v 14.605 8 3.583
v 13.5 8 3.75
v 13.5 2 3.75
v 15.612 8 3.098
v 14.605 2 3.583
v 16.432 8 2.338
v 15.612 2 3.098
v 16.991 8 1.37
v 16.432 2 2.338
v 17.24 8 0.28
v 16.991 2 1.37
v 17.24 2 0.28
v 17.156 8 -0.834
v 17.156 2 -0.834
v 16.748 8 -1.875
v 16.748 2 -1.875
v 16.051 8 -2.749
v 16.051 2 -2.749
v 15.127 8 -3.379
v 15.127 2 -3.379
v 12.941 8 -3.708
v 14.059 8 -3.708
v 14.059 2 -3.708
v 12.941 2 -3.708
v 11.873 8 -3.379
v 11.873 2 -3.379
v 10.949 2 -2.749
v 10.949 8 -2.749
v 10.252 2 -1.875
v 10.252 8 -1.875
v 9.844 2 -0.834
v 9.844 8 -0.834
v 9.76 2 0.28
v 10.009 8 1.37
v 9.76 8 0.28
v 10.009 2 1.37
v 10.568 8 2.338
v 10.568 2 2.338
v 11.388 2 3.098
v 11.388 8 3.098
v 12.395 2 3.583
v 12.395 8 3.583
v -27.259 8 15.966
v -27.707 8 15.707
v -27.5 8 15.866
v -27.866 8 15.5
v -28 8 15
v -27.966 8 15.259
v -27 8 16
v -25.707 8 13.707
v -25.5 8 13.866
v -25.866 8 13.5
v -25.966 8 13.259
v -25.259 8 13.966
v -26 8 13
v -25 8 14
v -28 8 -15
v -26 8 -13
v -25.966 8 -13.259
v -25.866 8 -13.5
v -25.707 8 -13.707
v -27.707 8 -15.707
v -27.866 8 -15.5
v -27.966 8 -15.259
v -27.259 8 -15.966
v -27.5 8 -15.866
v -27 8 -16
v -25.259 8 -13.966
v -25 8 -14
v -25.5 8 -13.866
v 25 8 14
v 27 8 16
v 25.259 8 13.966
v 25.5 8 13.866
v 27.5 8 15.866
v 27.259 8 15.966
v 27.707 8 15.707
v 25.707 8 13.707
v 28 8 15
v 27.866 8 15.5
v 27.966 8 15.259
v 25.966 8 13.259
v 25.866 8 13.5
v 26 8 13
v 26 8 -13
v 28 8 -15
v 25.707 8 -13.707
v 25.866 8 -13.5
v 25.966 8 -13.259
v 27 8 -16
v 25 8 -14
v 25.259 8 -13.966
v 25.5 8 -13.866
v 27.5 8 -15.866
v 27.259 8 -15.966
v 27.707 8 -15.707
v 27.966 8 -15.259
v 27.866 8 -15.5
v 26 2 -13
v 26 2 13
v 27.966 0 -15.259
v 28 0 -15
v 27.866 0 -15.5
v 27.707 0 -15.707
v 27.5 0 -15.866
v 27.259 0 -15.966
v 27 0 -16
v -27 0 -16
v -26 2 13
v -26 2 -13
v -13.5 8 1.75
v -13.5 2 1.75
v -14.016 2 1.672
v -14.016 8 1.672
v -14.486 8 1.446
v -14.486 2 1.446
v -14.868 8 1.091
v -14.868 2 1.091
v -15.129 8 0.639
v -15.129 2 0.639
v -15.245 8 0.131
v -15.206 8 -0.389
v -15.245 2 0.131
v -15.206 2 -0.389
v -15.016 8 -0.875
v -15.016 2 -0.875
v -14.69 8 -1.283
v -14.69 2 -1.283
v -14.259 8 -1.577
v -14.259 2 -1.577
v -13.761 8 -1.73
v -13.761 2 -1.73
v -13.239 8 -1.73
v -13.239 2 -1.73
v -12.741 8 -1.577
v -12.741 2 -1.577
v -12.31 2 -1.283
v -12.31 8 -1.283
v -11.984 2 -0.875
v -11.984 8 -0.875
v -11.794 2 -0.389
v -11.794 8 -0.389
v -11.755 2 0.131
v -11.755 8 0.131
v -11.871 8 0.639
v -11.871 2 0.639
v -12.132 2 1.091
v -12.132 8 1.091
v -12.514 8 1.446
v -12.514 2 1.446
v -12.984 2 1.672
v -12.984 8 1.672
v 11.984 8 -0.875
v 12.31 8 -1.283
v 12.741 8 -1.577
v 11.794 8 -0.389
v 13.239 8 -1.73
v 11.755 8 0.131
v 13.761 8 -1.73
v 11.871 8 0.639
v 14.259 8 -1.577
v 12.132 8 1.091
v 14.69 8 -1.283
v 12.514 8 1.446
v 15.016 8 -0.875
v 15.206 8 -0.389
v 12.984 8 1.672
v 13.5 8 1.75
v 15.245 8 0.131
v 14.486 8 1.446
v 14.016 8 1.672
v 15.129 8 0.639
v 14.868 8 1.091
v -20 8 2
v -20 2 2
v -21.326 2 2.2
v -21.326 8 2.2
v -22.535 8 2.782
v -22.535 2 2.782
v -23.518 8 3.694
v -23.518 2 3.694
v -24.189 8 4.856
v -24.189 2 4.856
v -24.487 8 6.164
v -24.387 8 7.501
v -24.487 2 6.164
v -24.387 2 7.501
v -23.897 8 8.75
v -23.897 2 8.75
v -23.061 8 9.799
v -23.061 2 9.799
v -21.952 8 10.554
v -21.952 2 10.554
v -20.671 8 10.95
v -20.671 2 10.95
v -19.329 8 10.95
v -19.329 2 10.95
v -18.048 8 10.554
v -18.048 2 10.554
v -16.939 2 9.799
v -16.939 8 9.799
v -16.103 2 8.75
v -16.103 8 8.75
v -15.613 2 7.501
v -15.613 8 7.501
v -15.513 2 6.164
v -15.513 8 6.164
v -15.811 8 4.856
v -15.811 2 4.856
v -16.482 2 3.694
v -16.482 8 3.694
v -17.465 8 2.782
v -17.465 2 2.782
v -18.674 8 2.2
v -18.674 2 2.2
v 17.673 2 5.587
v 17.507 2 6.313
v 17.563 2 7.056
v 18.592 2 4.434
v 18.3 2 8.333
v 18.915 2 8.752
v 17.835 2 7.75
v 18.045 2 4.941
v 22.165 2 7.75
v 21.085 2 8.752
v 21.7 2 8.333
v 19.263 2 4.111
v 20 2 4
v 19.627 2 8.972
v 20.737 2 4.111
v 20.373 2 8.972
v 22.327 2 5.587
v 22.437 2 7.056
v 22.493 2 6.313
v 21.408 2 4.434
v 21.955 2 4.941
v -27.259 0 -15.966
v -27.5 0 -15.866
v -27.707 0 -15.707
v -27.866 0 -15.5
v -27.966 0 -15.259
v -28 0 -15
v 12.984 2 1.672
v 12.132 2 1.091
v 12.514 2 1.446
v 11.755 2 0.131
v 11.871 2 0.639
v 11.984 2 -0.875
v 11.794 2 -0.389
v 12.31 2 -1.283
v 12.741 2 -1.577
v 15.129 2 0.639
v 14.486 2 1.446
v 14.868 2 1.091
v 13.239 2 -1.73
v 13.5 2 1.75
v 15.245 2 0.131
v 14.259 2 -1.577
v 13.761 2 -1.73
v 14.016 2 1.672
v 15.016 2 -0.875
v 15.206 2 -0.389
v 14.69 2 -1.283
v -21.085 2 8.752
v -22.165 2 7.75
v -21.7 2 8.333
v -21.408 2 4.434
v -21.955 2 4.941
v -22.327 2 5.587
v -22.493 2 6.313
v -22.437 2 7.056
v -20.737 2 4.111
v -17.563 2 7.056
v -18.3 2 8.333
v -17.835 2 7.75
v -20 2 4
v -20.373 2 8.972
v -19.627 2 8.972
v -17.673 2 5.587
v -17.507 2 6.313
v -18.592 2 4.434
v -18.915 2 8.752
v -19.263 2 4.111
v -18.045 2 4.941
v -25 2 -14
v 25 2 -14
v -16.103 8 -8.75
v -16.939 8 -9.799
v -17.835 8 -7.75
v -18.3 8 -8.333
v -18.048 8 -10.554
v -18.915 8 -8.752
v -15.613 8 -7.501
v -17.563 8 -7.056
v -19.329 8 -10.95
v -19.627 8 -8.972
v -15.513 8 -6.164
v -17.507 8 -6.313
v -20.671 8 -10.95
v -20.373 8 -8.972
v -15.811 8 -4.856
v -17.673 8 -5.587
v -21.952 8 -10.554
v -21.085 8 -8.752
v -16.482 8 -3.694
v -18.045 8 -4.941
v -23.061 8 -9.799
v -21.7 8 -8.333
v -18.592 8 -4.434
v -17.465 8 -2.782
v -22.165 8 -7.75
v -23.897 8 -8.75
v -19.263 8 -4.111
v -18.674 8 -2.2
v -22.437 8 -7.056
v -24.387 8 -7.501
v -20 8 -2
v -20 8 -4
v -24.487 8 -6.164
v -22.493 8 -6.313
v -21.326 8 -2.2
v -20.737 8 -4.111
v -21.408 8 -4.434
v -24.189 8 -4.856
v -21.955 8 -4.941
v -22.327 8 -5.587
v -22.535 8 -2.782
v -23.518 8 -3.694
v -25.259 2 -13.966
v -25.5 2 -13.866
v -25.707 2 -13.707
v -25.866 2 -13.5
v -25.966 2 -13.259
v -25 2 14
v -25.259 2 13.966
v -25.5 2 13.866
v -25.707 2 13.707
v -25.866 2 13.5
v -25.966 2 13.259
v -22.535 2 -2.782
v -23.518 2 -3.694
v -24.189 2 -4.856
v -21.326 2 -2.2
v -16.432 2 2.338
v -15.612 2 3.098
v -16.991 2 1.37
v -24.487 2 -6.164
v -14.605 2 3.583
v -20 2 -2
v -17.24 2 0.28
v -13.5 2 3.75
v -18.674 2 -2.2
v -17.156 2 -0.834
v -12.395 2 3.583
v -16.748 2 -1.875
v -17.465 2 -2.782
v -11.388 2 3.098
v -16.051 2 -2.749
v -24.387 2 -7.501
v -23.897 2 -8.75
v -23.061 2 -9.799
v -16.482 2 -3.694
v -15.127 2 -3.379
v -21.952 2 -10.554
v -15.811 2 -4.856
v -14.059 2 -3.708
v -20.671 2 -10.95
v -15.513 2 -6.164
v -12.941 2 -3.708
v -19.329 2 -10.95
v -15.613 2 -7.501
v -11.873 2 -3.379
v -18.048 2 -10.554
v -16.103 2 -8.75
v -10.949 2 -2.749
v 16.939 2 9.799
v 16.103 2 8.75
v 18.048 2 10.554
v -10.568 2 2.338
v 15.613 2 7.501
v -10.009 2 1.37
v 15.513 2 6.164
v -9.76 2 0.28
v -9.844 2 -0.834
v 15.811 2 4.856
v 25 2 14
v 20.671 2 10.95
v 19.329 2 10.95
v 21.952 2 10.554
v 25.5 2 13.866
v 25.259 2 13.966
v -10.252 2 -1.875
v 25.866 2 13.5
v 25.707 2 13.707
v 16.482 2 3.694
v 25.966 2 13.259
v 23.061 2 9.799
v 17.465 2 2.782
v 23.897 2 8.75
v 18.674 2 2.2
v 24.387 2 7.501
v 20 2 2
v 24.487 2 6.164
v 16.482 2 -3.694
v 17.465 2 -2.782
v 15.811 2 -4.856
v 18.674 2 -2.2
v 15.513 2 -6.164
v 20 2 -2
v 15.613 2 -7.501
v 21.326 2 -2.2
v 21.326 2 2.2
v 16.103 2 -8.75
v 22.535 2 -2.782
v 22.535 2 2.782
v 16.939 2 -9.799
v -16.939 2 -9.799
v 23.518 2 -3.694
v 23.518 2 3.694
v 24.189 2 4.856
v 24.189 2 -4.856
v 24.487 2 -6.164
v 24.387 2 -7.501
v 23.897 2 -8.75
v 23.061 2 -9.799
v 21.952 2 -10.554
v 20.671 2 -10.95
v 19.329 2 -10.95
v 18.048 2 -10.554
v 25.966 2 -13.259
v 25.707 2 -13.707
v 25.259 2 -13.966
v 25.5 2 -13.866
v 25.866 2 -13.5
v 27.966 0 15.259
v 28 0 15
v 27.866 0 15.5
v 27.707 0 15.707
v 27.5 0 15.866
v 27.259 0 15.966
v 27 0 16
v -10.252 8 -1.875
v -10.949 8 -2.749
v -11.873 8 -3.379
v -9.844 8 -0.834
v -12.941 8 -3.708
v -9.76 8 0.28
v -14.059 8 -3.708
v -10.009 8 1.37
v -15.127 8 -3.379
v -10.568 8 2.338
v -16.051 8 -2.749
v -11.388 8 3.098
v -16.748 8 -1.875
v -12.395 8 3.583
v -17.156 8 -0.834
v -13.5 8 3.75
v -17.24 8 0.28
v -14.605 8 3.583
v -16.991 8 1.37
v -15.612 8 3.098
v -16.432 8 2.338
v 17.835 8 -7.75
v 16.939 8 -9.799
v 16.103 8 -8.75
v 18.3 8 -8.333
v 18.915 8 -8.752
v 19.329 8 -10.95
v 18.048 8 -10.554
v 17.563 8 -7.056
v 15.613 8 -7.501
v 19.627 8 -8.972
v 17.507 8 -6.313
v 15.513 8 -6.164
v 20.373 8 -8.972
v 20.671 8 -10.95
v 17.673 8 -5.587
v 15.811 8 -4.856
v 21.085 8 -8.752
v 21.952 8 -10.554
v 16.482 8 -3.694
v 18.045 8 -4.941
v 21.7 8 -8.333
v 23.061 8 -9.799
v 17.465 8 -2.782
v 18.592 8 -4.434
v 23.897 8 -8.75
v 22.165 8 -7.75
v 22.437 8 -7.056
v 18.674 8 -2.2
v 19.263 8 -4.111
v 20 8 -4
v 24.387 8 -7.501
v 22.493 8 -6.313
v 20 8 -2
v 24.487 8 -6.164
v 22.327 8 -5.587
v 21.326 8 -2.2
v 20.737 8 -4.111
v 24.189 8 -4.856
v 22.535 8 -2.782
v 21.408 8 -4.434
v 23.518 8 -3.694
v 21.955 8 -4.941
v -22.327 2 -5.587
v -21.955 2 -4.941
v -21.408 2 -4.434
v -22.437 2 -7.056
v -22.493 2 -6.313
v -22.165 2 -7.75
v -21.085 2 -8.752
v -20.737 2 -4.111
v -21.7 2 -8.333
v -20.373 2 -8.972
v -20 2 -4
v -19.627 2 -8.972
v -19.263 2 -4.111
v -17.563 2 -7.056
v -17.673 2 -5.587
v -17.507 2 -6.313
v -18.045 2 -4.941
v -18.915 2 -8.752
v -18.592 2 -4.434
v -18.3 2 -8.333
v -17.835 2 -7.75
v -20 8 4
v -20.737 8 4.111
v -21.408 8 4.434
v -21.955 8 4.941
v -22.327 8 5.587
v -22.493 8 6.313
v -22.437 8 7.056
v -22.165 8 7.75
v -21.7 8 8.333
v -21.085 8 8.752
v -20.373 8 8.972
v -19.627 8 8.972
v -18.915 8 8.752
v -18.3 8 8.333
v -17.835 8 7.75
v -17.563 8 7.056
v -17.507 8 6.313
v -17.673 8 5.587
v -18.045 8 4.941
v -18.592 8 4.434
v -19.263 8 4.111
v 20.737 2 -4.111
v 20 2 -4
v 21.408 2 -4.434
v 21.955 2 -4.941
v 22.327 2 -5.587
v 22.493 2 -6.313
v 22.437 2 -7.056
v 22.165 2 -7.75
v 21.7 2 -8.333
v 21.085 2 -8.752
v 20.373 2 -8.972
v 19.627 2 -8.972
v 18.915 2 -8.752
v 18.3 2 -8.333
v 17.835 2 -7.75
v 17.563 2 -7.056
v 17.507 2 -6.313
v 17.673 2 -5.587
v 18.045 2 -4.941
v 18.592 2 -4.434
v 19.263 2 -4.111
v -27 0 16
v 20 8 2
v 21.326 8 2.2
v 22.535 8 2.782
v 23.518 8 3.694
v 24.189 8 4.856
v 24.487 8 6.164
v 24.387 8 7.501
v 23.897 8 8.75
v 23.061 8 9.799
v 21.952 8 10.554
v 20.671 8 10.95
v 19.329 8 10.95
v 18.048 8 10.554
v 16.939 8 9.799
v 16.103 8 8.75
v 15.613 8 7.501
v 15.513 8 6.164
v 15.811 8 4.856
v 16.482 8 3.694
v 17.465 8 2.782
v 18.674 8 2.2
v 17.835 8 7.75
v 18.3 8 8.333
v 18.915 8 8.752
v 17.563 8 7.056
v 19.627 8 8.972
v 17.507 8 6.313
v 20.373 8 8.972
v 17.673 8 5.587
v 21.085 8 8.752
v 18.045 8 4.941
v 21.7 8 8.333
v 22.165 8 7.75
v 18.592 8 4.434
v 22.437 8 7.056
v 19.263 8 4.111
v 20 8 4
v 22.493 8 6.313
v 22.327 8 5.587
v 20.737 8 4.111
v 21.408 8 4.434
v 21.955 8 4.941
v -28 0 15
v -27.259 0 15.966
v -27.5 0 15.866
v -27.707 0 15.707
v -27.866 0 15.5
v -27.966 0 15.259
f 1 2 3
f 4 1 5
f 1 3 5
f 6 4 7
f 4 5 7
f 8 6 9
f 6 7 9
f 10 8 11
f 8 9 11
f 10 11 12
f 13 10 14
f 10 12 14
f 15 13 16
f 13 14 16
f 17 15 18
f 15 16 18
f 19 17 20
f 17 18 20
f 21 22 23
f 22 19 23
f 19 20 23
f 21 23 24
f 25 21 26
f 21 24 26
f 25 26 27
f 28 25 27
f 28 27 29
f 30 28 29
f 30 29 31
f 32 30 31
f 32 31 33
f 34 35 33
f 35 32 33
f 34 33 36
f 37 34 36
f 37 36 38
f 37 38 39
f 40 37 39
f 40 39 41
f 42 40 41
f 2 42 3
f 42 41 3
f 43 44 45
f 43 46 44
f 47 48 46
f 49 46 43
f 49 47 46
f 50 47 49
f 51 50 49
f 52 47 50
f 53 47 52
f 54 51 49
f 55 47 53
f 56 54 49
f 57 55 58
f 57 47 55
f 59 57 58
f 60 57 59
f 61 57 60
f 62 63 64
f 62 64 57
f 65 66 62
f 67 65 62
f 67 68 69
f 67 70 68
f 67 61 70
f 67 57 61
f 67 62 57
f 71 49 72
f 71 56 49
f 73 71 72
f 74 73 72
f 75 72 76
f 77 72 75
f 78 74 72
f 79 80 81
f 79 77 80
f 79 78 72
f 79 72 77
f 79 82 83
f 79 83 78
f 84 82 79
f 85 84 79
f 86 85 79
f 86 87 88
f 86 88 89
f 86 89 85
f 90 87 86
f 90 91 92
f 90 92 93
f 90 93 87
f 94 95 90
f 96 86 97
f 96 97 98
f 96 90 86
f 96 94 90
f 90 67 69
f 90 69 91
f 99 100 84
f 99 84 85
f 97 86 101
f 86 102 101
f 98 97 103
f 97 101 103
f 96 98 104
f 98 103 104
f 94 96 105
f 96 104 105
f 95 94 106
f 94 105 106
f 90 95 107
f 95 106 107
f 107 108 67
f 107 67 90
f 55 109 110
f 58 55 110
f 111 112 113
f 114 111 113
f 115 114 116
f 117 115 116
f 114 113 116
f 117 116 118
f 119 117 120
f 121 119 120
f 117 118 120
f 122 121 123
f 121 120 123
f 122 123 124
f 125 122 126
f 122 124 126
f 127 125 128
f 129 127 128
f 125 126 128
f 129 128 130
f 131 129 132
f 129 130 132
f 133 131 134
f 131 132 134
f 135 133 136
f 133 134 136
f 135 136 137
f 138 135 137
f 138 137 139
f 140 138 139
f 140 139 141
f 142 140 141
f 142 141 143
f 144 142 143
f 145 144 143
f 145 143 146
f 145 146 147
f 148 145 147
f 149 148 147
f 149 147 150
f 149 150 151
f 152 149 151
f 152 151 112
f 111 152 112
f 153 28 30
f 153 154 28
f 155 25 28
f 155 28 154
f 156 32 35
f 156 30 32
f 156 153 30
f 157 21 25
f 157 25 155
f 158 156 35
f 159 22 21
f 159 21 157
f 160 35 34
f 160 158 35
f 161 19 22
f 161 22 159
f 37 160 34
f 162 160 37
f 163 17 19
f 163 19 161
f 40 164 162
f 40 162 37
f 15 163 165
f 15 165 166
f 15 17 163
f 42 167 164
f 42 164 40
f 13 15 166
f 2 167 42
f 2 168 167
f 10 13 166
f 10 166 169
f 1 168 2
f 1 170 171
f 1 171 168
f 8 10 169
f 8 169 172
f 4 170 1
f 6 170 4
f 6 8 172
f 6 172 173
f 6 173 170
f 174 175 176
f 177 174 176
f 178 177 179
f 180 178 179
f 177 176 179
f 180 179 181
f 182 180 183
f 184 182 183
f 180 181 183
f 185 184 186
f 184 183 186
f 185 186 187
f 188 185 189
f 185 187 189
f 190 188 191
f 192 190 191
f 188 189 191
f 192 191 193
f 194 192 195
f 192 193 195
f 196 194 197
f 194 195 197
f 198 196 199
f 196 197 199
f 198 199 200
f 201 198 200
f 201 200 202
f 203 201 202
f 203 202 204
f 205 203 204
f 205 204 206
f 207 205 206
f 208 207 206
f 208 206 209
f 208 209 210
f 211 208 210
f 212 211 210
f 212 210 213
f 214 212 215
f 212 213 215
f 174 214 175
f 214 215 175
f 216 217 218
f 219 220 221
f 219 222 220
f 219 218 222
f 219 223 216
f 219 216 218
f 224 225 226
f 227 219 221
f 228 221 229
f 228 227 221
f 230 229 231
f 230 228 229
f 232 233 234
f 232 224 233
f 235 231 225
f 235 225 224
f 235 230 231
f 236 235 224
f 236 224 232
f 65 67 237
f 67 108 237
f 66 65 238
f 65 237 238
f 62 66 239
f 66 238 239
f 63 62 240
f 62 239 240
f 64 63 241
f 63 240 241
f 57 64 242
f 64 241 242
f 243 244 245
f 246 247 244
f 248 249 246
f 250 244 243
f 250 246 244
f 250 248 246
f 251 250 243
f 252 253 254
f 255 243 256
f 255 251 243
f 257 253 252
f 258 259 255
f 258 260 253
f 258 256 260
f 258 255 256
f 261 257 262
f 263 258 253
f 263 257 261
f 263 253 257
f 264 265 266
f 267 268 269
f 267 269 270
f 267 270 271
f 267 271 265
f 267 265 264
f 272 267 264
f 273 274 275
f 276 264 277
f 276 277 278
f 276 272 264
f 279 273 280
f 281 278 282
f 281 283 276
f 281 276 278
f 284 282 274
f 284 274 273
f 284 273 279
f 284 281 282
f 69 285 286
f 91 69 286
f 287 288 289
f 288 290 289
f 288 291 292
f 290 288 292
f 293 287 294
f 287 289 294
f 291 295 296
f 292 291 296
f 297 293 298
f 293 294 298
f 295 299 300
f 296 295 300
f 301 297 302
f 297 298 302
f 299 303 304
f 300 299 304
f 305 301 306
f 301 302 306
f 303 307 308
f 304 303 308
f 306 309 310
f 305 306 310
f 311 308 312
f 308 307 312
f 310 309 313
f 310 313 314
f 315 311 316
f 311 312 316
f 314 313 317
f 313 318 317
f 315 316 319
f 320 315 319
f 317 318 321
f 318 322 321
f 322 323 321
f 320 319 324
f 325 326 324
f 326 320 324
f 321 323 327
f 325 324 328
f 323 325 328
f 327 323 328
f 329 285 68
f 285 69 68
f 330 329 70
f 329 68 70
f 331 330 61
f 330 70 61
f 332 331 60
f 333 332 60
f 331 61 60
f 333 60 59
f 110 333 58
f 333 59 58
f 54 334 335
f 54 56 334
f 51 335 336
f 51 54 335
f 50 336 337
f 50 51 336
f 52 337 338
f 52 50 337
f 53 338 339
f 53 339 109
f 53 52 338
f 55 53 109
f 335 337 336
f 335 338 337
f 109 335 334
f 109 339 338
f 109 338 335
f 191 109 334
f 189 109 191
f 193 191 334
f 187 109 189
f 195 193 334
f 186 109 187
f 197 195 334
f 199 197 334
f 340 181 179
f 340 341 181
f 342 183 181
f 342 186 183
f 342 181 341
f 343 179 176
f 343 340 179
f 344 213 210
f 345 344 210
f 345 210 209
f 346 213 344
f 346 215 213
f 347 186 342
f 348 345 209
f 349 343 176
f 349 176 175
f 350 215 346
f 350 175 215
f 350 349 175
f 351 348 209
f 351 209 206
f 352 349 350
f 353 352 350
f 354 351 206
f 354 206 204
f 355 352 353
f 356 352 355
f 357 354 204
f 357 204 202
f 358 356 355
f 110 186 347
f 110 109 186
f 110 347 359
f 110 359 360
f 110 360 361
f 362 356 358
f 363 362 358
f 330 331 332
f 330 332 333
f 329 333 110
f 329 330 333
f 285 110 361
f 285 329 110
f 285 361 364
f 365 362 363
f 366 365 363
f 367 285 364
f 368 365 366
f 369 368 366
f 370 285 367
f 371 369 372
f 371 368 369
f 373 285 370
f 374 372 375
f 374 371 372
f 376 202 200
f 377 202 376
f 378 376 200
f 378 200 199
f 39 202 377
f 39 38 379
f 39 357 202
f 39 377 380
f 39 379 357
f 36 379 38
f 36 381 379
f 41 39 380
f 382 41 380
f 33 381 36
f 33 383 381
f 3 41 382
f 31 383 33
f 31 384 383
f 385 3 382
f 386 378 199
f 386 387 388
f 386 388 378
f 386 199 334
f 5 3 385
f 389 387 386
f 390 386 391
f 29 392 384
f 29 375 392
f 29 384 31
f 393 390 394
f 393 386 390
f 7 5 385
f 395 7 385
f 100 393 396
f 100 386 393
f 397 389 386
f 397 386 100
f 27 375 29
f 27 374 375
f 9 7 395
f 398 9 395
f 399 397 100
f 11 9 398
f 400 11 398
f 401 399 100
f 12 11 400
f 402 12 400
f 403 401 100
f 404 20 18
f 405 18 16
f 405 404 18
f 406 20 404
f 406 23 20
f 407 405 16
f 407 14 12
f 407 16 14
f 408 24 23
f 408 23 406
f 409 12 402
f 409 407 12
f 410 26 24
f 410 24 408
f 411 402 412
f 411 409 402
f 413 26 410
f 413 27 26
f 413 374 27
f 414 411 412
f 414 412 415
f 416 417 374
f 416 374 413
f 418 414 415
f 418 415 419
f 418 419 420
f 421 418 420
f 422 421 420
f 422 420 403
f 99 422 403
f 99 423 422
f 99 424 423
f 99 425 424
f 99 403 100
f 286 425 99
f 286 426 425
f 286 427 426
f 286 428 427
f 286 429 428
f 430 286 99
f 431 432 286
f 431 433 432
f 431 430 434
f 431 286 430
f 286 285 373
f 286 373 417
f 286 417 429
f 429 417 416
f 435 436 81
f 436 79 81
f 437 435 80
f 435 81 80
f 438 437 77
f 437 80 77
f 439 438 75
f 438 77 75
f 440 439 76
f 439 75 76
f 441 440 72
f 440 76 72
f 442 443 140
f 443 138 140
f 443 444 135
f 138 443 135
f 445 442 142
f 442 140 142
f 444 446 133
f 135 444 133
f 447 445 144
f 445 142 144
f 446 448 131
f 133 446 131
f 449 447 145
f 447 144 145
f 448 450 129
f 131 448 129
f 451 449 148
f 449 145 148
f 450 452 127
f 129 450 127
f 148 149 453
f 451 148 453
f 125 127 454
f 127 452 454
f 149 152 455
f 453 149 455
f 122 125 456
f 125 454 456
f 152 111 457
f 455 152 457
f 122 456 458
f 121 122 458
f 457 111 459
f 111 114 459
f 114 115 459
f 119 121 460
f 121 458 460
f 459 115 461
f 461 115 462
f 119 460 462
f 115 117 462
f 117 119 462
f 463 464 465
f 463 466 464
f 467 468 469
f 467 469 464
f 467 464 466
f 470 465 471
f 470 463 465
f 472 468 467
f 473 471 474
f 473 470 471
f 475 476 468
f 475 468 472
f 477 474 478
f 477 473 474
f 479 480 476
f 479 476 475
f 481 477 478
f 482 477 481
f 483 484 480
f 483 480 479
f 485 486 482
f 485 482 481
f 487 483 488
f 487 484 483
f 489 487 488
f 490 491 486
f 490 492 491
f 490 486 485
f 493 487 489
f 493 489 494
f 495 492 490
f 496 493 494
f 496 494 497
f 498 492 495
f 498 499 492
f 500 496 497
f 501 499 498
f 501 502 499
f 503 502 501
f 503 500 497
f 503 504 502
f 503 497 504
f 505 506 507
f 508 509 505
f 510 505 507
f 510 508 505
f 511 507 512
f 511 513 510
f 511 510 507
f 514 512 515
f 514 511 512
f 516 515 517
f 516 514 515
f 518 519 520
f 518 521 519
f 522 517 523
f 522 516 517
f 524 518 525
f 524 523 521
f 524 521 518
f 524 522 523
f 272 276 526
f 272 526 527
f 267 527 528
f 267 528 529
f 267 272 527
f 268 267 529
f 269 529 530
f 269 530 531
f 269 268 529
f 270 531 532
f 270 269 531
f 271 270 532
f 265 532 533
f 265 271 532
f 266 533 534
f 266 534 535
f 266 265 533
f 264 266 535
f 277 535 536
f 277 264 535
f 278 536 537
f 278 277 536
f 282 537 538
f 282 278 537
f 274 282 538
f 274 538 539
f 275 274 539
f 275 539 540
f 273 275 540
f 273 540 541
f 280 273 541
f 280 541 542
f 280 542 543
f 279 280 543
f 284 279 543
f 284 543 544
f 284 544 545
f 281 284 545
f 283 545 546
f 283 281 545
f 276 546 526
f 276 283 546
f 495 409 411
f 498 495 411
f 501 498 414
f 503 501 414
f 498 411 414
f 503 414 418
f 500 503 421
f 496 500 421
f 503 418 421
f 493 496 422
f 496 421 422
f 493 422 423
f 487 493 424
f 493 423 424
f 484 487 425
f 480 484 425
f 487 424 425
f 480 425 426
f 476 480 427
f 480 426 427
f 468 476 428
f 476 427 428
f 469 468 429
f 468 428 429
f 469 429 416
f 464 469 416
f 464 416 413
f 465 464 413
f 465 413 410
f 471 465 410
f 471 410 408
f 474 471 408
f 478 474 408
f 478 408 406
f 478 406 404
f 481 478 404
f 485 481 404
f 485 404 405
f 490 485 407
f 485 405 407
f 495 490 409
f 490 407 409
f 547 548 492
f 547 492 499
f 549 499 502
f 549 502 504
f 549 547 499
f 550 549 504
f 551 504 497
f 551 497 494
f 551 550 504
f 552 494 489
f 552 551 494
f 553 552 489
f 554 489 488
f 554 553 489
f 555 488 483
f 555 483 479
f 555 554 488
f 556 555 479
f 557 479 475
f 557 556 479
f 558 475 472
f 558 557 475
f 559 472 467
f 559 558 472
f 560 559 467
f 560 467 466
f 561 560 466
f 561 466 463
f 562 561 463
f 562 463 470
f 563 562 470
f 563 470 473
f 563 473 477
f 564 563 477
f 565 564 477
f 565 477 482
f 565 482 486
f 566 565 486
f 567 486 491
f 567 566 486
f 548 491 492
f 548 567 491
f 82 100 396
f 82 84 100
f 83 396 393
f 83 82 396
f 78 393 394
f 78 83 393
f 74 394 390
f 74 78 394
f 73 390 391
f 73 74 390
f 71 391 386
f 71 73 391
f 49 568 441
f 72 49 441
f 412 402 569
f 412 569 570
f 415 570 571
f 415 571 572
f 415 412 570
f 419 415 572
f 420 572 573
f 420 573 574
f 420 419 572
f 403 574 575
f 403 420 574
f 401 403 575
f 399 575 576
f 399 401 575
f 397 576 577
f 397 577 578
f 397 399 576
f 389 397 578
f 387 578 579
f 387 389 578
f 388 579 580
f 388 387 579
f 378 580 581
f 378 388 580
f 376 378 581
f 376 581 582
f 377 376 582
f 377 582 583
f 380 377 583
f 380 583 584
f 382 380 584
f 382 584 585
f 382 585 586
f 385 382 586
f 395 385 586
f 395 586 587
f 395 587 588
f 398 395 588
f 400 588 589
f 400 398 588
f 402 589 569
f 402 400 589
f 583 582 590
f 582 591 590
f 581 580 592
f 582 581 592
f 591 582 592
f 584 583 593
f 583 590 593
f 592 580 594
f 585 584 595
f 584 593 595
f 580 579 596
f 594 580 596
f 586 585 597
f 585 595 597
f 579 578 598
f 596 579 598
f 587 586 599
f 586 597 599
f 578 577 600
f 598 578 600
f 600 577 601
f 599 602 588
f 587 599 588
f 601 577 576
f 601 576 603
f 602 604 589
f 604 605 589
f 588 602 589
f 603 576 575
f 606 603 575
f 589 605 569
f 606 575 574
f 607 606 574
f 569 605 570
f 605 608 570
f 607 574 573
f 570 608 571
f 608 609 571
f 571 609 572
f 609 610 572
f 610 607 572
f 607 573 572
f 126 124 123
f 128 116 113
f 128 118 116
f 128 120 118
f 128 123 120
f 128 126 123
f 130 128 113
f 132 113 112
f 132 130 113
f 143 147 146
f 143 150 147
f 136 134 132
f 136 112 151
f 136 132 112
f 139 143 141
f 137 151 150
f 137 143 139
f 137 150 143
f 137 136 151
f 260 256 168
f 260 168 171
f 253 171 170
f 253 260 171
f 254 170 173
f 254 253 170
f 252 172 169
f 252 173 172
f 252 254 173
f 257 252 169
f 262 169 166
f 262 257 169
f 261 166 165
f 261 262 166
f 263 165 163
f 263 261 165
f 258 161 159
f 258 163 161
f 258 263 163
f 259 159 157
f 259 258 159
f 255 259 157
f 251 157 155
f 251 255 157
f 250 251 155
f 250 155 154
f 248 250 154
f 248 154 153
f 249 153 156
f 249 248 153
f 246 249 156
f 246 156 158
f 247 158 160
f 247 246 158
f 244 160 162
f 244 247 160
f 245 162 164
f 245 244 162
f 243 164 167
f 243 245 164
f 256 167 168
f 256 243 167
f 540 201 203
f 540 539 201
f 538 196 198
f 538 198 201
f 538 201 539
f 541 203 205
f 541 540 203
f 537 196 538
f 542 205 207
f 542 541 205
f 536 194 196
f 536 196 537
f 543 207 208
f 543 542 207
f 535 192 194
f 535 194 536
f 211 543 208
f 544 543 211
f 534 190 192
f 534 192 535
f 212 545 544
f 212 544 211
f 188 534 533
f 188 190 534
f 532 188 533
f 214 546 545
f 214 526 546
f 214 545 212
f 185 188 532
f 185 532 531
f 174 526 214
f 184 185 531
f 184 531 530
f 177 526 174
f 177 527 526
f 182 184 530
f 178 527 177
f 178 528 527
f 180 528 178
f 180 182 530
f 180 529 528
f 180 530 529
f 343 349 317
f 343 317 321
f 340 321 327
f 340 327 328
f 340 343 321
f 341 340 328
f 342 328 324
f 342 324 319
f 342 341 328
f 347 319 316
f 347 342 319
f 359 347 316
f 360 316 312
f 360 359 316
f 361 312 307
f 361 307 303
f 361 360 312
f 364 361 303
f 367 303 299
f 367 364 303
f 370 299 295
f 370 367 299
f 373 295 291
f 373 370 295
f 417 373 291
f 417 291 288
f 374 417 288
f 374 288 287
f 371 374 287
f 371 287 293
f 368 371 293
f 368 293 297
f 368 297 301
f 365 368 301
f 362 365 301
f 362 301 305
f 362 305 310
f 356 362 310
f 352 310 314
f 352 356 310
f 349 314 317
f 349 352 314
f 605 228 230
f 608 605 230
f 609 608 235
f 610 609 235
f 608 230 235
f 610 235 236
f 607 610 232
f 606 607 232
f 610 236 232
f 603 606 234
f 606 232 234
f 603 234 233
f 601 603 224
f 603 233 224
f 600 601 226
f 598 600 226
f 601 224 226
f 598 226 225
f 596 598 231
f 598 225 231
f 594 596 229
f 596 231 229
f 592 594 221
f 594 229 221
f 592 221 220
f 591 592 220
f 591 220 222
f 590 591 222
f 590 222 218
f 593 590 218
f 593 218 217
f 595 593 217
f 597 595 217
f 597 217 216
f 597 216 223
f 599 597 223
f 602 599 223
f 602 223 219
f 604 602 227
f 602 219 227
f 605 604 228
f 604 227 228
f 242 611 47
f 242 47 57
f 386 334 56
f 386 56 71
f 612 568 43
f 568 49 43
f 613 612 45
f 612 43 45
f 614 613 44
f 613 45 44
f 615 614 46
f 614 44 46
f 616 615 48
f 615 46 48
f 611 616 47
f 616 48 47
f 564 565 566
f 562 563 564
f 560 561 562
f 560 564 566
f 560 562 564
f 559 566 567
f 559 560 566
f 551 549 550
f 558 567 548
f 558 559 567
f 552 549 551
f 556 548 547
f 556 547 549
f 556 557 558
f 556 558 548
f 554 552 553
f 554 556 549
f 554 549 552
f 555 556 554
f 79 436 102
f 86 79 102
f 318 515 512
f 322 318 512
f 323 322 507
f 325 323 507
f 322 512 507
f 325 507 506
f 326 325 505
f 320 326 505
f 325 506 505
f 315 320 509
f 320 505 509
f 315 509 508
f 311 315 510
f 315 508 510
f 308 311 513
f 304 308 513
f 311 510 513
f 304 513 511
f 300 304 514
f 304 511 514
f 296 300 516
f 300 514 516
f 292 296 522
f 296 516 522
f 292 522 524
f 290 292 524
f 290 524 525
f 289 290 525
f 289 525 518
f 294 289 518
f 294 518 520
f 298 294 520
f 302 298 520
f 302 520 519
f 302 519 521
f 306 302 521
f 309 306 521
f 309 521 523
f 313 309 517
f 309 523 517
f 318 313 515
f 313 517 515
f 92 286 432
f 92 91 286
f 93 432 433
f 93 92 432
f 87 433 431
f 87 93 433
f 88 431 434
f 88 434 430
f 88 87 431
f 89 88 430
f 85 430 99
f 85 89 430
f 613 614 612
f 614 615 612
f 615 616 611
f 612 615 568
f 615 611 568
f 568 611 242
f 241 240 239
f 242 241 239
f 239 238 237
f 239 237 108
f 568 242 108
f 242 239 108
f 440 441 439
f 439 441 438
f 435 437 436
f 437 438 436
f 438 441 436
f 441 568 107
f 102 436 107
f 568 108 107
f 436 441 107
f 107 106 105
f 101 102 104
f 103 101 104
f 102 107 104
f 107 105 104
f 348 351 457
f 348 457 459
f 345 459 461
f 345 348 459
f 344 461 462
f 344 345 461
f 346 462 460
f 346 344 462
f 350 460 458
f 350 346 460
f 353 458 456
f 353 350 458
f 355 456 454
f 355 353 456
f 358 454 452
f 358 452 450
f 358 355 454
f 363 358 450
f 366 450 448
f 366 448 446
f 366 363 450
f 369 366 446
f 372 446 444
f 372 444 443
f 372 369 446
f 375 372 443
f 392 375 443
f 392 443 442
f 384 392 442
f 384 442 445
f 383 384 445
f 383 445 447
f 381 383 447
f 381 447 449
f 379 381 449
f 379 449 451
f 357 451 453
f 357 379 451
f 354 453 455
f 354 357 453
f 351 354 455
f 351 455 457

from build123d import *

# Parameters (mm, degrees)
SKETCH1_W                 = 56
SKETCH1_H                 = 32
SKETCH1_W_2               = 52
SKETCH1_H_2               = 28
BOSS_EXTRUDE1_DEPTH       = 8
SKETCH2_W                 = 56
SKETCH2_H                 = 32
BOSS_EXTRUDE2_DEPTH       = 2
SKETCH3_R                 = 3.75
SKETCH3_R_2               = 1.75
SKETCH3_R_3               = 4.5
SKETCH3_R_4               = 2.5
BOSS_EXTRUDE3_DEPTH       = 6
MIRROR2_COPY_1_SKETCH_R   = 3.75
MIRROR2_COPY_1_SKETCH_R_2 = 1.75
MIRROR2_COPY_1_SKETCH_R_3 = 4.5
MIRROR2_COPY_1_SKETCH_R_4 = 2.5
MIRROR2_COPY_1_DEPTH      = 6
FILLET1_R                 = 1


with BuildPart() as part:
    # Sketch1 → Boss-Extrude1 (new body)
    with BuildSketch(Plane(origin=(0, 0, 0), x_dir=(1, 0, 0), z_dir=(0, 1, 0))):
        Rectangle(SKETCH1_W, SKETCH1_H)
        Rectangle(SKETCH1_W_2, SKETCH1_H_2, mode=Mode.SUBTRACT)
    extrude(amount=BOSS_EXTRUDE1_DEPTH)

    # Sketch2 → Boss-Extrude2 (add)
    with BuildSketch(Plane(origin=(0, 0, 0), x_dir=(1, 0, 0), z_dir=(0, 1, 0))):
        Rectangle(SKETCH2_W, SKETCH2_H)
    extrude(amount=BOSS_EXTRUDE2_DEPTH)

    # Sketch3 → Boss-Extrude3 (add)
    # profile 1 of 2: a face of its own
    with BuildSketch(Plane(origin=(0, 2, 0), x_dir=(1, 0, 0), z_dir=(0, 1, 0))):
        with Locations(Location((13.5, 0, 0), (0, 0, 270))):
            Circle(SKETCH3_R)
        with Locations(Location((13.5, 0, 0), (0, 0, 270))):
            Circle(SKETCH3_R_2, mode=Mode.SUBTRACT)
    # profile 2 of 2: a face of its own
    with BuildSketch(Plane(origin=(0, 2, 0), x_dir=(1, 0, 0), z_dir=(0, 1, 0))):
        with Locations(Location((20, 6.5, 0), (0, 0, 270))):
            Circle(SKETCH3_R_3)
        with Locations(Location((20, 6.5, 0), (0, 0, 270))):
            Circle(SKETCH3_R_4, mode=Mode.SUBTRACT)
    boss_extrude3 = extrude(amount=BOSS_EXTRUDE3_DEPTH)

    # Mirror1: Boss-Extrude3 across plane
    add(boss_extrude3.mirror(Plane.XY))

    # Mirror2: Boss-Extrude3 across plane
    add(boss_extrude3.mirror(Plane(origin=(0, 0, 0), x_dir=(0, 0, 1), z_dir=(1, 0, 0))))

    # Mirror2 copy 1 sketch → Mirror2 copy 1 (add)
    # profile 1 of 2: a face of its own
    with BuildSketch(Plane(origin=(0, 2, 0), x_dir=(-1, 0, 0), z_dir=(0, 1, 0))):
        with Locations(Location((13.5, 0, 0), (0, 0, 270))):
            Circle(MIRROR2_COPY_1_SKETCH_R)
        with Locations(Location((13.5, 0, 0), (0, 0, 270))):
            Circle(MIRROR2_COPY_1_SKETCH_R_2, mode=Mode.SUBTRACT)
    # profile 2 of 2: a face of its own
    with BuildSketch(Plane(origin=(0, 2, 0), x_dir=(-1, 0, 0), z_dir=(0, 1, 0))):
        with Locations(Location((20, 6.5, 0), (0, 0, 270))):
            Circle(MIRROR2_COPY_1_SKETCH_R_3)
        with Locations(Location((20, 6.5, 0), (0, 0, 270))):
            Circle(MIRROR2_COPY_1_SKETCH_R_4, mode=Mode.SUBTRACT)
    extrude(amount=MIRROR2_COPY_1_DEPTH)

    # Fillet1
    fillet1_edges = [part.edges().sort_by_distance(p)[0] for p in [
        (26, 5, 14),
        (26, 5, -14),
        (-26, 5, -14),
        (-26, 5, 14),
        (-28, 4, 16),
        (-28, 4, -16),
        (28, 4, -16),
        (28, 4, 16),
    ]]
    fillet(fillet1_edges, radius=FILLET1_R)


solid = part.part
